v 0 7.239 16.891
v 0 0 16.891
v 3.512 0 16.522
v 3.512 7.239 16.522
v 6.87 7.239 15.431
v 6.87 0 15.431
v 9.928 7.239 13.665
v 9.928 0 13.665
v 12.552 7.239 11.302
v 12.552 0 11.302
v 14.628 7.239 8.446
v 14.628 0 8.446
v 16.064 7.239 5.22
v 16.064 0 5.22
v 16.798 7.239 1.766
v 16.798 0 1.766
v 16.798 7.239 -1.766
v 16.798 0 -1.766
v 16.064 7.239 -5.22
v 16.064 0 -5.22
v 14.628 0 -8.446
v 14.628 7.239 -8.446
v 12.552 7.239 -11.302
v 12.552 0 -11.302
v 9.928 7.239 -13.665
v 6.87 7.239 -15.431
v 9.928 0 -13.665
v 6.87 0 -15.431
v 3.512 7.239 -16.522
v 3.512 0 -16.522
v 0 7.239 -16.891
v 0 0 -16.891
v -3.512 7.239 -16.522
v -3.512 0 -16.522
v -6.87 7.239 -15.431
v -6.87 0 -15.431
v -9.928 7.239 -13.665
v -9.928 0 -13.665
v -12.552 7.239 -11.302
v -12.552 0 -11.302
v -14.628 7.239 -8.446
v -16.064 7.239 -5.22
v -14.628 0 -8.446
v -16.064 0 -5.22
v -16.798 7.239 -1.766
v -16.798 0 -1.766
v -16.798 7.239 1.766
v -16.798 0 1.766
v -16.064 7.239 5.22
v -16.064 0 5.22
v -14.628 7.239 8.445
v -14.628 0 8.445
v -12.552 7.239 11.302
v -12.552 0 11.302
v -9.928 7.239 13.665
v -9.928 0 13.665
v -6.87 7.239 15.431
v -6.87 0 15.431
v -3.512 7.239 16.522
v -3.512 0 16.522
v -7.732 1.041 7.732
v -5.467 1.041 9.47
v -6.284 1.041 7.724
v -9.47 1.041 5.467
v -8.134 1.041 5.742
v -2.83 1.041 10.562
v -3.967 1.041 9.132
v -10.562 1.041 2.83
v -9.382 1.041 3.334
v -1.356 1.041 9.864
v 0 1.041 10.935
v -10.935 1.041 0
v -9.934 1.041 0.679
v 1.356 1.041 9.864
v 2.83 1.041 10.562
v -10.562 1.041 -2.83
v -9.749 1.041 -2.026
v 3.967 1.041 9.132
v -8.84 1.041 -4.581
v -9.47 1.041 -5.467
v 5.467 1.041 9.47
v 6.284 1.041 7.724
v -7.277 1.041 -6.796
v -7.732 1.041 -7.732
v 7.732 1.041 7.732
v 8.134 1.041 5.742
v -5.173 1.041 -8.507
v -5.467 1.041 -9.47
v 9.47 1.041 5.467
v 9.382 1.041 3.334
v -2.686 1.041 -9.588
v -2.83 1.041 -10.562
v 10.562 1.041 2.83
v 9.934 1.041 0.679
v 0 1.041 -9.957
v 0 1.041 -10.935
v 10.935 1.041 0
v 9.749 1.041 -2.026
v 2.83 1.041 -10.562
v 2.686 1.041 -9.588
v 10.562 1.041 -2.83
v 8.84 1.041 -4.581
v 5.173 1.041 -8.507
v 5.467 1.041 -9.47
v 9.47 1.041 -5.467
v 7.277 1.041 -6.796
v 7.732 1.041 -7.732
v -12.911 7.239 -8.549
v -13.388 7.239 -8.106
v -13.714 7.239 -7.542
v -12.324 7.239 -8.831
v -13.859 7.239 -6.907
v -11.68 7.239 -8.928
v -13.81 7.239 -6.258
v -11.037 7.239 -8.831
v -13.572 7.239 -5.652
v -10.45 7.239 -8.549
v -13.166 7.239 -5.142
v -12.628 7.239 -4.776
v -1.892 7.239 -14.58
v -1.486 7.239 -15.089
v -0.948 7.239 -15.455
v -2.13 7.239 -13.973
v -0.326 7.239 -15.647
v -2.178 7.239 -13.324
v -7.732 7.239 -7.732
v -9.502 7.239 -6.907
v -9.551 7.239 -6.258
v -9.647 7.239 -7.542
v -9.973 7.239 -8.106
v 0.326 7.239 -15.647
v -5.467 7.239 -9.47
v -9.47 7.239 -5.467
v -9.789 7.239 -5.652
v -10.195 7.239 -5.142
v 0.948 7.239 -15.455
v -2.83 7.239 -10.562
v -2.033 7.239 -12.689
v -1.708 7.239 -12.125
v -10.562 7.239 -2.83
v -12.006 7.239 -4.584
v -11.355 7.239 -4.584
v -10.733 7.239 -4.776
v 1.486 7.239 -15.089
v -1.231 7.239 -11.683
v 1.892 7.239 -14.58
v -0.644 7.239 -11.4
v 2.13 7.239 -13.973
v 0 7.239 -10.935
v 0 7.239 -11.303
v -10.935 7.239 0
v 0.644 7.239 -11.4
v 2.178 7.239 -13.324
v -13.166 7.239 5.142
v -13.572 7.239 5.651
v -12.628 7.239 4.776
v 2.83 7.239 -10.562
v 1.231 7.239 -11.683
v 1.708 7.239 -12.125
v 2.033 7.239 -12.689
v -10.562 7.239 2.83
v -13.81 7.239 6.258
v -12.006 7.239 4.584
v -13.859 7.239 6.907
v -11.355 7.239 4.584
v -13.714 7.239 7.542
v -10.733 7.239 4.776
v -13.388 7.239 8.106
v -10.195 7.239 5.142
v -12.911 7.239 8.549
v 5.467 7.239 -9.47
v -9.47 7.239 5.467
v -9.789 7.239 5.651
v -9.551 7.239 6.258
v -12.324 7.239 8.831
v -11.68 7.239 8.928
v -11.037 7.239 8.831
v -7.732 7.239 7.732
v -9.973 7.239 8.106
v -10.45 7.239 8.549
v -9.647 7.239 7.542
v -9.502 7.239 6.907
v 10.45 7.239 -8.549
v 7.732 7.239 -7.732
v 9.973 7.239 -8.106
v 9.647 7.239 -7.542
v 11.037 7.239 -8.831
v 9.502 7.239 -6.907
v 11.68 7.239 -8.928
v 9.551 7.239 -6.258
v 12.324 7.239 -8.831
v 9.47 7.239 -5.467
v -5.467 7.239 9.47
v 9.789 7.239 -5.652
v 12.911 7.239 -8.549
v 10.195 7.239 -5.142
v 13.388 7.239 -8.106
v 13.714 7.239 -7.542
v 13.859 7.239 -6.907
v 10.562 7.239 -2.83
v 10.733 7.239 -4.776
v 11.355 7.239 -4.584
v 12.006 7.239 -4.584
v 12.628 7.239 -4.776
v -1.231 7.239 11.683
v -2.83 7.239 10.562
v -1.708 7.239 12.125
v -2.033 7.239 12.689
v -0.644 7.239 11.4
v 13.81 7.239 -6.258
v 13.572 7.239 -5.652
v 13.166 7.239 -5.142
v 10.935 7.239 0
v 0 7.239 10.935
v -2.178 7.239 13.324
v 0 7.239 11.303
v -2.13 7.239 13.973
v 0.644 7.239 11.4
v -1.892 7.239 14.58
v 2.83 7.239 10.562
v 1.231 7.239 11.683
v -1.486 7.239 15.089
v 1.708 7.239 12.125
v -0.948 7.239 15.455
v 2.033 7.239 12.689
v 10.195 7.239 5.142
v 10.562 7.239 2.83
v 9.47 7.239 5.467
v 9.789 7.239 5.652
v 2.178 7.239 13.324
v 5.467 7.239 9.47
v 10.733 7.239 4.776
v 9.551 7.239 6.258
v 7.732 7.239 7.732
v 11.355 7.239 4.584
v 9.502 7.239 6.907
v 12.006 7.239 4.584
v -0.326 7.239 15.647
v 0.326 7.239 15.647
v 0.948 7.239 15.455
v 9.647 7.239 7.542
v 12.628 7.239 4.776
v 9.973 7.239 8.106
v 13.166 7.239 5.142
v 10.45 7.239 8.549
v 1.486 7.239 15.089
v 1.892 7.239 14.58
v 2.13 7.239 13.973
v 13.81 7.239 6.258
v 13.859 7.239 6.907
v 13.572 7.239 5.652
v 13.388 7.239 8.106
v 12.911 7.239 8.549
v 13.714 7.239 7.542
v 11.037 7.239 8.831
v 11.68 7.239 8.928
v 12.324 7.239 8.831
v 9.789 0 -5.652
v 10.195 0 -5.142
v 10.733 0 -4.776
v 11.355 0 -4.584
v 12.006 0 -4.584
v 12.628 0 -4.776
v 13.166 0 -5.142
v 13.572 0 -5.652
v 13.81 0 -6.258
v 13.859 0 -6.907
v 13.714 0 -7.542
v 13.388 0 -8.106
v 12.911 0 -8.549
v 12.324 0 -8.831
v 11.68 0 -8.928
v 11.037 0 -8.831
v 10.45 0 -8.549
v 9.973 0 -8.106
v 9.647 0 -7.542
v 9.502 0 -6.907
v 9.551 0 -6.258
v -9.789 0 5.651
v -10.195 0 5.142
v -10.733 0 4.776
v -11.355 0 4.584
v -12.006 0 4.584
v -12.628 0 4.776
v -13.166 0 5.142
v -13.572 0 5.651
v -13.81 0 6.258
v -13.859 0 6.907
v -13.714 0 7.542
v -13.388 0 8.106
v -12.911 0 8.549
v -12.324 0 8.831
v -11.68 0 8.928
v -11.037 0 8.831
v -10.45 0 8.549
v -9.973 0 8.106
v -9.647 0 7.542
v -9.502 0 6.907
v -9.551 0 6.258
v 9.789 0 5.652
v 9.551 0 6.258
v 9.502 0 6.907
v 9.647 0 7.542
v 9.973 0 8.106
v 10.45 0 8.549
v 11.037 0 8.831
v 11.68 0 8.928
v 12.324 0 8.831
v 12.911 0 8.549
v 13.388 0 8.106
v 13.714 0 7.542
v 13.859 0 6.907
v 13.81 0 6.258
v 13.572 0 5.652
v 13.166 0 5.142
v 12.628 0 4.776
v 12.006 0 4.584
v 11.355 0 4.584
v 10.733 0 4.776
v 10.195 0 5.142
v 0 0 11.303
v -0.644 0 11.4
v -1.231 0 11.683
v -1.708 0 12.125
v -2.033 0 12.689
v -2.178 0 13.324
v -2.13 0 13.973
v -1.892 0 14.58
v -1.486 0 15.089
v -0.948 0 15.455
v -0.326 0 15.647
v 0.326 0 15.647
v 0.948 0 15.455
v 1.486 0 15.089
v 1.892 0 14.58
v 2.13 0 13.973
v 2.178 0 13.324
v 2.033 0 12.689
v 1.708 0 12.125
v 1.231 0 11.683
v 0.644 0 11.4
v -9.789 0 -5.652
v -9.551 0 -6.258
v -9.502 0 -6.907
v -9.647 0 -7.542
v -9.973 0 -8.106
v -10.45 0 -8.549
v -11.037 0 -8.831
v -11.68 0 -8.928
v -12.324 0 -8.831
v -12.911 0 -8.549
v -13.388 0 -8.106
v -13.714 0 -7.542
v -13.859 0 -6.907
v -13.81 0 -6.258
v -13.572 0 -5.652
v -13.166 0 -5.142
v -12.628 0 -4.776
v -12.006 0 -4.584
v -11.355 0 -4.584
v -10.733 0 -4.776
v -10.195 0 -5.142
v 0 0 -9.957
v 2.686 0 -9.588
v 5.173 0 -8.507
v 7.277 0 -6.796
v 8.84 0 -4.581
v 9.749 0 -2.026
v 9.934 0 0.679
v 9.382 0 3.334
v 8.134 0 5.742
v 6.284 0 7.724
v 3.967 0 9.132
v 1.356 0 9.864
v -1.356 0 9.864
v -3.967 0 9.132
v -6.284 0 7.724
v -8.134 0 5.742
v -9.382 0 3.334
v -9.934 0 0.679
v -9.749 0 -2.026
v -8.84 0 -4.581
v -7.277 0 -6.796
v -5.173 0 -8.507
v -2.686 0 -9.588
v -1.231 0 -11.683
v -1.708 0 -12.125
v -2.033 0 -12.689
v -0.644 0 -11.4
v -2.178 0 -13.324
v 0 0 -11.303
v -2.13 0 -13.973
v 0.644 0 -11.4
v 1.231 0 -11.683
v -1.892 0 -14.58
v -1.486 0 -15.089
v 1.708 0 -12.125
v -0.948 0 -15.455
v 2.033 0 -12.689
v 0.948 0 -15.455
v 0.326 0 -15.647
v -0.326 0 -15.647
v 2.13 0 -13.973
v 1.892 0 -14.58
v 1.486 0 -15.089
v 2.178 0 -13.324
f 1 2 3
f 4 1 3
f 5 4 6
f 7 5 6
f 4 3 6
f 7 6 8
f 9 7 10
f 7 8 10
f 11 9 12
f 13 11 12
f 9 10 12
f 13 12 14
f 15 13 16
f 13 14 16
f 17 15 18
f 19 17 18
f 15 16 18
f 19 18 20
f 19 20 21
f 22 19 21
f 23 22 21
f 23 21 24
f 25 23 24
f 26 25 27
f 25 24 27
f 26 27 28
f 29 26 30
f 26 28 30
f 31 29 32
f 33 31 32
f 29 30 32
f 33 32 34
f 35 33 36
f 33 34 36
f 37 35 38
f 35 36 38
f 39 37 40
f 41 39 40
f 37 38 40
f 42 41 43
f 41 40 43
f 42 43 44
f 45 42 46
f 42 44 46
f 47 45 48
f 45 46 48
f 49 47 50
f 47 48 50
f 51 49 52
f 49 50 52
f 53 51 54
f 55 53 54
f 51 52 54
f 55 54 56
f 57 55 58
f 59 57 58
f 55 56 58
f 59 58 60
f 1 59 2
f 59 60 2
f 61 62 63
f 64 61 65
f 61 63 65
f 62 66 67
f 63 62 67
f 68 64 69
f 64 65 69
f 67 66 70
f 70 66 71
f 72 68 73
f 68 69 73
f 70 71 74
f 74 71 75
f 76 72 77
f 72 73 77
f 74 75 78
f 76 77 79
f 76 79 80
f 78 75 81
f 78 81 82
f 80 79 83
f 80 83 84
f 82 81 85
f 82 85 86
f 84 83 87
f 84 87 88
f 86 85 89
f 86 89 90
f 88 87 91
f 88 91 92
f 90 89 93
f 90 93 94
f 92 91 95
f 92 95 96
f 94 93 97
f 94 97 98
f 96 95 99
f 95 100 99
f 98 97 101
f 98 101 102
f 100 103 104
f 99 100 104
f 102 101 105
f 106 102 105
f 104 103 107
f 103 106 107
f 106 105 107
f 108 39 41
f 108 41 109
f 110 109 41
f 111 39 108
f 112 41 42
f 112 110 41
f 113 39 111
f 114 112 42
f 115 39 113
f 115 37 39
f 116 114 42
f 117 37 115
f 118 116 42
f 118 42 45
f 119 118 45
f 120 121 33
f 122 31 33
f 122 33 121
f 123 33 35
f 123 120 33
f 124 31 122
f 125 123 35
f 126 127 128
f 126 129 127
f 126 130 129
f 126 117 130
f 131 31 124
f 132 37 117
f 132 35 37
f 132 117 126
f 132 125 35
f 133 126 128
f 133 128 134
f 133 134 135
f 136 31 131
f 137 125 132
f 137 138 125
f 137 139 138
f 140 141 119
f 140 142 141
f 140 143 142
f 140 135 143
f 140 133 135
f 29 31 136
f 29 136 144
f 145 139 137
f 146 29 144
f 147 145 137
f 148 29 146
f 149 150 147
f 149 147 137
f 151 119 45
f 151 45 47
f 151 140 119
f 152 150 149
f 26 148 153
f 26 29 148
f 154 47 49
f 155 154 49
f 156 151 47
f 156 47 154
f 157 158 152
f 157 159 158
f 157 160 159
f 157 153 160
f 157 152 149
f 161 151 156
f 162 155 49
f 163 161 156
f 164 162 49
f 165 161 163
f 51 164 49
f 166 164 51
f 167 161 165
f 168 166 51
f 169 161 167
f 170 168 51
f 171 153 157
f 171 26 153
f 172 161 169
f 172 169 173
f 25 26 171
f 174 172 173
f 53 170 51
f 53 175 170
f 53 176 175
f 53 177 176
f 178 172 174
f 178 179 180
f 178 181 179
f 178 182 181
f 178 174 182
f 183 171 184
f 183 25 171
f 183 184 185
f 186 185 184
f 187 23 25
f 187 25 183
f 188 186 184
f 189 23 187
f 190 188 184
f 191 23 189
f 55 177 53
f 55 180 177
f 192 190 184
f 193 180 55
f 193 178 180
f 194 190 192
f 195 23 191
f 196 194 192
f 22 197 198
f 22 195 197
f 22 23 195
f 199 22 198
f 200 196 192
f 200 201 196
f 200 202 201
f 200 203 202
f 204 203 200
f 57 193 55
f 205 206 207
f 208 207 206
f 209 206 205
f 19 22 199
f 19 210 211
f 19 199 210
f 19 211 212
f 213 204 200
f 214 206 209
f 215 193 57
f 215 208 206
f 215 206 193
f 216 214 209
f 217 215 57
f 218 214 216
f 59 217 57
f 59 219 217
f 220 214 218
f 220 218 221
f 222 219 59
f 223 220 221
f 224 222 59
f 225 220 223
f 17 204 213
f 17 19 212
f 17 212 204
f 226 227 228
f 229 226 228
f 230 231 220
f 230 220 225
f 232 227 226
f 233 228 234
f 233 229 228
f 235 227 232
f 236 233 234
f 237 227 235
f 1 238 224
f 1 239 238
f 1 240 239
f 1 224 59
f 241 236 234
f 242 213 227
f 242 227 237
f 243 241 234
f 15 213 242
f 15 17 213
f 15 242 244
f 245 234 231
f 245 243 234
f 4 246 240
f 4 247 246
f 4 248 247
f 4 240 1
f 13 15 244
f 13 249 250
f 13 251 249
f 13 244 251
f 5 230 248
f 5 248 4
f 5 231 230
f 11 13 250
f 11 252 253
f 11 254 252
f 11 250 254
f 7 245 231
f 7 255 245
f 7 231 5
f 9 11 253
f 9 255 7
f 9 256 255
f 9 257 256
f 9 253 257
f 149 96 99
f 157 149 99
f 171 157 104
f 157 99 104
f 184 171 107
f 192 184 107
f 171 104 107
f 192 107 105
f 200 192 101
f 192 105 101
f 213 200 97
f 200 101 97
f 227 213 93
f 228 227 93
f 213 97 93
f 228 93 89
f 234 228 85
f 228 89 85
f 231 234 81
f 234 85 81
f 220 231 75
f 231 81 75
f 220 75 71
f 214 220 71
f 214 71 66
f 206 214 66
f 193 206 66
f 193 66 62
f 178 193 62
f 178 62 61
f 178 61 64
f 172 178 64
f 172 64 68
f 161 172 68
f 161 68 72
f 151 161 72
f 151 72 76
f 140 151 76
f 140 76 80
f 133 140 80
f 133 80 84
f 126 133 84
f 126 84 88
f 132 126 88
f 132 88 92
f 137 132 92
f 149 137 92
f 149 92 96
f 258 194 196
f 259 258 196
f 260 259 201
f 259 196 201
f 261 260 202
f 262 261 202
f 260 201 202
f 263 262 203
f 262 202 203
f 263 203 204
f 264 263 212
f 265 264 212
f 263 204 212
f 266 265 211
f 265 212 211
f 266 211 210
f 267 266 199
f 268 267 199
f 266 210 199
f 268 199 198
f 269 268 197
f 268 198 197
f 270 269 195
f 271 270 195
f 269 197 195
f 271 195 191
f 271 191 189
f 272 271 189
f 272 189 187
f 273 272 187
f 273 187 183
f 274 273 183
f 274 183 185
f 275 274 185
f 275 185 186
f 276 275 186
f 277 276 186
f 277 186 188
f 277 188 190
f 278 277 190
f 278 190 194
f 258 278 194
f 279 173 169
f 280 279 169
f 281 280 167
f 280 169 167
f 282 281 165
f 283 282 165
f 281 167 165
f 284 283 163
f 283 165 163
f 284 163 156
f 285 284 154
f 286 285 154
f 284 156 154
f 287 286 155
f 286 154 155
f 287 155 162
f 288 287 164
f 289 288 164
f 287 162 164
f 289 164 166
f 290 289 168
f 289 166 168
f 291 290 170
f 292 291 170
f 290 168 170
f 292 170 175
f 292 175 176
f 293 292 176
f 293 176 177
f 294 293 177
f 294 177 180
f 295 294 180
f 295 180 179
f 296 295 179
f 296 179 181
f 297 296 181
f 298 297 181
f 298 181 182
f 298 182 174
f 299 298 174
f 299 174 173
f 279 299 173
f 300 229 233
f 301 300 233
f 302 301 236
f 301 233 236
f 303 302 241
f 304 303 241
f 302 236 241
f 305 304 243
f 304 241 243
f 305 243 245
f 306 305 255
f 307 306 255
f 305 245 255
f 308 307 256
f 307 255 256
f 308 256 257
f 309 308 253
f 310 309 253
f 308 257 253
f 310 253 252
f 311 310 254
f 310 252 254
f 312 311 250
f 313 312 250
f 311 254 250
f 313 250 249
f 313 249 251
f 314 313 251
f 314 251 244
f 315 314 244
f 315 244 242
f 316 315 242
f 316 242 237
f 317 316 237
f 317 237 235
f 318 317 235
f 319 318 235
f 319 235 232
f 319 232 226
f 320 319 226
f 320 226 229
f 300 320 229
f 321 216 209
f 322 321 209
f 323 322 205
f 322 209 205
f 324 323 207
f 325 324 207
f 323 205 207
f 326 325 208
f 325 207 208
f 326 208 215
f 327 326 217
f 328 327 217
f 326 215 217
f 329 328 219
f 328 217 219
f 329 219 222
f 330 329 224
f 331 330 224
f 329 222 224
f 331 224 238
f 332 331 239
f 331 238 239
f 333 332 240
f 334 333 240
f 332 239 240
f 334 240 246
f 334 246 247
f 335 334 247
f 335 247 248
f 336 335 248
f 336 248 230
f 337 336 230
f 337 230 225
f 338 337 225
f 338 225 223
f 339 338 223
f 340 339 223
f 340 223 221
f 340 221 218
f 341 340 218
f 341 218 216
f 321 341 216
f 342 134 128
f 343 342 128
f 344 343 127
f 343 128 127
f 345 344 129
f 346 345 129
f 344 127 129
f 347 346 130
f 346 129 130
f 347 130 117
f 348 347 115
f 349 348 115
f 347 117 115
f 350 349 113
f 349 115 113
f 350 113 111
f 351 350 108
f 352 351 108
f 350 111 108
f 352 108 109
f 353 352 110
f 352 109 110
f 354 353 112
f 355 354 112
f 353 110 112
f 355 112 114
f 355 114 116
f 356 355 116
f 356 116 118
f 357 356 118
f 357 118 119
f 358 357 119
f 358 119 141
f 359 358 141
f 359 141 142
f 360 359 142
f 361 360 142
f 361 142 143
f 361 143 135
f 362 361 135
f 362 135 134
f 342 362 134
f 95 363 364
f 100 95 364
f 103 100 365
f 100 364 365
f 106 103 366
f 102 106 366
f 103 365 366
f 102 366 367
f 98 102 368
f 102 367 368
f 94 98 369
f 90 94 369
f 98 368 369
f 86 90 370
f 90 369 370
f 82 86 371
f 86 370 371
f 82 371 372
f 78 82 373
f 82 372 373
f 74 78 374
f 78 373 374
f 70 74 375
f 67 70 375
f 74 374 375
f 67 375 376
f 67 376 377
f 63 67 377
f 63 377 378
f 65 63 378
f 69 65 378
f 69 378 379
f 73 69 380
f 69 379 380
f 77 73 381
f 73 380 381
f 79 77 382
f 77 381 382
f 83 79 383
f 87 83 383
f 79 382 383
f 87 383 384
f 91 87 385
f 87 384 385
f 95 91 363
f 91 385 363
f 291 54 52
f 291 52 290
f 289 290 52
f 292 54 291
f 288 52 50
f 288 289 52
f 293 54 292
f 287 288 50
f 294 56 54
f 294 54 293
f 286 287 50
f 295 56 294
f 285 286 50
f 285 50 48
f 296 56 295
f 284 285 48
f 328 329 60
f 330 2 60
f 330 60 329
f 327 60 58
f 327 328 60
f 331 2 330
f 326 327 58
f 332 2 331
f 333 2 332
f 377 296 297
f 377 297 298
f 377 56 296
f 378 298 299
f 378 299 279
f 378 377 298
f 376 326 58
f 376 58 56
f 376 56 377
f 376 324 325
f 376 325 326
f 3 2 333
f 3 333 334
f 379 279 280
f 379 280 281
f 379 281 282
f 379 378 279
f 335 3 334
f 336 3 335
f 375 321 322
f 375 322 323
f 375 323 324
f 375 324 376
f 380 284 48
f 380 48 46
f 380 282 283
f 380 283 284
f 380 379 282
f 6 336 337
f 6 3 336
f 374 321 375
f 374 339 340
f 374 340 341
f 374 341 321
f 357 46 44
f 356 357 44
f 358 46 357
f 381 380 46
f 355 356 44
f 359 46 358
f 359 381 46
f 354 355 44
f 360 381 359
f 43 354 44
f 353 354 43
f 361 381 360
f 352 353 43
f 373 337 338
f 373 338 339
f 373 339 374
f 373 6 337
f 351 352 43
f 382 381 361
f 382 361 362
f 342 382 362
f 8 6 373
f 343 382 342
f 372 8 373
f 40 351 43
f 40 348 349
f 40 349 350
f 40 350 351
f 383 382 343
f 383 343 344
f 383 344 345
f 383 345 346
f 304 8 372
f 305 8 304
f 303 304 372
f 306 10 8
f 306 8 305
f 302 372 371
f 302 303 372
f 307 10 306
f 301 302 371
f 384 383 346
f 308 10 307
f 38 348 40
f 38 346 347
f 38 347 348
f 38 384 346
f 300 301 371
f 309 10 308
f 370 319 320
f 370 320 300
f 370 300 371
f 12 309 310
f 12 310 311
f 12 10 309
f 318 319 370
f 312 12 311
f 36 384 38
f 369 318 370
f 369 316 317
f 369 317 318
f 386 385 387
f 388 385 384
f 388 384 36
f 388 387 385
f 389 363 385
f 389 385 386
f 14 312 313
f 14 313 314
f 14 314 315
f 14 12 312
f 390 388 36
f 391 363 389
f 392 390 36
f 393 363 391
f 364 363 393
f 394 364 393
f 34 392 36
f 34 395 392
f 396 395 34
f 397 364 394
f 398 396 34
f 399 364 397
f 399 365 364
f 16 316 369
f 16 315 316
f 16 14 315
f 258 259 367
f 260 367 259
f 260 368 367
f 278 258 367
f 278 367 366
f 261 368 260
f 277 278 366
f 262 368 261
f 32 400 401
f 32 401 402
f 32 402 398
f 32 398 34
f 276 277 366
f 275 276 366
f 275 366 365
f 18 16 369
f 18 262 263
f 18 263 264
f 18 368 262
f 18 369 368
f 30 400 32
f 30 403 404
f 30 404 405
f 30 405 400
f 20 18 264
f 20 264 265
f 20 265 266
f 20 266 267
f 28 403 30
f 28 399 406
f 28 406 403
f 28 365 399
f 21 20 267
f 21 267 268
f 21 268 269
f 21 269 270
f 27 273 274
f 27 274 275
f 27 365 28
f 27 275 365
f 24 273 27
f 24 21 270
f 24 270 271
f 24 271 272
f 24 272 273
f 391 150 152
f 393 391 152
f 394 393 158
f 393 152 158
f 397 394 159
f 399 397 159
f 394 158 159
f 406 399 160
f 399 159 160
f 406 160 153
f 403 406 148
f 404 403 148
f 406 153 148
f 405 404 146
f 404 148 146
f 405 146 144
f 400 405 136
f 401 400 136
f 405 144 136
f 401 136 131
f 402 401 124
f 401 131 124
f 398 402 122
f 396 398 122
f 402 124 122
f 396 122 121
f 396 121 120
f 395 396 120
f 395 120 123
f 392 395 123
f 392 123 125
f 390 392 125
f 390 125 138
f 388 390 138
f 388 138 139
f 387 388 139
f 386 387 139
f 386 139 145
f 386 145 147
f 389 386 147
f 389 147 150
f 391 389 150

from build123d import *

# Parameters (mm, degrees)
SKETCH1_R         = 16.891
EXTRUDE1_DEPTH    = 7.239
SKETCH2_R         = 10.9347
EXTRUDE2_DEPTH    = 25.960266084
SKETCH3_R         = 10.9347
SKETCH3_R_2       = 9.9568
EXTRUDE3_DEPTH    = 1.0414
SKETCH4_R         = 2.1844
EXTRUDE4_DEPTH    = 25.960266084
CIRPATTERN1_COUNT = 6


with BuildPart() as part:
    # Sketch1 → Extrude1 (new body)
    with BuildSketch(Plane(origin=(0, 0, 0), x_dir=(1, 0, 0), z_dir=(0, 1, 0))):
        with Locations(Location((0, 0, 0), (0, 0, 270))):
            Circle(SKETCH1_R)
    extrude(amount=EXTRUDE1_DEPTH)

    # Sketch2 → Extrude2 (cut, through all)
    with BuildSketch(Plane.XZ):
        with Locations(Location((0, 0, 0), (0, 0, 270))):
            Circle(SKETCH2_R)
    extrude(amount=-EXTRUDE2_DEPTH, mode=Mode.SUBTRACT)

    # Sketch3 → Extrude3 (add)
    with BuildSketch(Plane.XZ):
        with Locations(Location((0, 0, 0), (0, 0, 270))):
            Circle(SKETCH3_R)
        with Locations(Location((0, 0, 0), (0, 0, 270))):
            Circle(SKETCH3_R_2, mode=Mode.SUBTRACT)
    extrude(amount=-EXTRUDE3_DEPTH)

    # Sketch4 → Extrude4 (cut, through all)
    with BuildSketch(Plane(origin=(0, 7.239, 0), x_dir=(1, 0, 0), z_dir=(0, 1, 0))):
        with Locations(Location((0, 13.4874, 0), (0, 0, 270))):
            Circle(SKETCH4_R)
    extrude4 = extrude(amount=-EXTRUDE4_DEPTH, mode=Mode.SUBTRACT)

    # CirPattern1: Extrude4 ×6 about axis
    cirpattern1_axis = Axis((0, 0, 0), (0, 1, 0))
    for i in range(1, CIRPATTERN1_COUNT):
        add(extrude4.rotate(cirpattern1_axis, i * 360 / CIRPATTERN1_COUNT), mode=Mode.SUBTRACT)


solid = part.part
